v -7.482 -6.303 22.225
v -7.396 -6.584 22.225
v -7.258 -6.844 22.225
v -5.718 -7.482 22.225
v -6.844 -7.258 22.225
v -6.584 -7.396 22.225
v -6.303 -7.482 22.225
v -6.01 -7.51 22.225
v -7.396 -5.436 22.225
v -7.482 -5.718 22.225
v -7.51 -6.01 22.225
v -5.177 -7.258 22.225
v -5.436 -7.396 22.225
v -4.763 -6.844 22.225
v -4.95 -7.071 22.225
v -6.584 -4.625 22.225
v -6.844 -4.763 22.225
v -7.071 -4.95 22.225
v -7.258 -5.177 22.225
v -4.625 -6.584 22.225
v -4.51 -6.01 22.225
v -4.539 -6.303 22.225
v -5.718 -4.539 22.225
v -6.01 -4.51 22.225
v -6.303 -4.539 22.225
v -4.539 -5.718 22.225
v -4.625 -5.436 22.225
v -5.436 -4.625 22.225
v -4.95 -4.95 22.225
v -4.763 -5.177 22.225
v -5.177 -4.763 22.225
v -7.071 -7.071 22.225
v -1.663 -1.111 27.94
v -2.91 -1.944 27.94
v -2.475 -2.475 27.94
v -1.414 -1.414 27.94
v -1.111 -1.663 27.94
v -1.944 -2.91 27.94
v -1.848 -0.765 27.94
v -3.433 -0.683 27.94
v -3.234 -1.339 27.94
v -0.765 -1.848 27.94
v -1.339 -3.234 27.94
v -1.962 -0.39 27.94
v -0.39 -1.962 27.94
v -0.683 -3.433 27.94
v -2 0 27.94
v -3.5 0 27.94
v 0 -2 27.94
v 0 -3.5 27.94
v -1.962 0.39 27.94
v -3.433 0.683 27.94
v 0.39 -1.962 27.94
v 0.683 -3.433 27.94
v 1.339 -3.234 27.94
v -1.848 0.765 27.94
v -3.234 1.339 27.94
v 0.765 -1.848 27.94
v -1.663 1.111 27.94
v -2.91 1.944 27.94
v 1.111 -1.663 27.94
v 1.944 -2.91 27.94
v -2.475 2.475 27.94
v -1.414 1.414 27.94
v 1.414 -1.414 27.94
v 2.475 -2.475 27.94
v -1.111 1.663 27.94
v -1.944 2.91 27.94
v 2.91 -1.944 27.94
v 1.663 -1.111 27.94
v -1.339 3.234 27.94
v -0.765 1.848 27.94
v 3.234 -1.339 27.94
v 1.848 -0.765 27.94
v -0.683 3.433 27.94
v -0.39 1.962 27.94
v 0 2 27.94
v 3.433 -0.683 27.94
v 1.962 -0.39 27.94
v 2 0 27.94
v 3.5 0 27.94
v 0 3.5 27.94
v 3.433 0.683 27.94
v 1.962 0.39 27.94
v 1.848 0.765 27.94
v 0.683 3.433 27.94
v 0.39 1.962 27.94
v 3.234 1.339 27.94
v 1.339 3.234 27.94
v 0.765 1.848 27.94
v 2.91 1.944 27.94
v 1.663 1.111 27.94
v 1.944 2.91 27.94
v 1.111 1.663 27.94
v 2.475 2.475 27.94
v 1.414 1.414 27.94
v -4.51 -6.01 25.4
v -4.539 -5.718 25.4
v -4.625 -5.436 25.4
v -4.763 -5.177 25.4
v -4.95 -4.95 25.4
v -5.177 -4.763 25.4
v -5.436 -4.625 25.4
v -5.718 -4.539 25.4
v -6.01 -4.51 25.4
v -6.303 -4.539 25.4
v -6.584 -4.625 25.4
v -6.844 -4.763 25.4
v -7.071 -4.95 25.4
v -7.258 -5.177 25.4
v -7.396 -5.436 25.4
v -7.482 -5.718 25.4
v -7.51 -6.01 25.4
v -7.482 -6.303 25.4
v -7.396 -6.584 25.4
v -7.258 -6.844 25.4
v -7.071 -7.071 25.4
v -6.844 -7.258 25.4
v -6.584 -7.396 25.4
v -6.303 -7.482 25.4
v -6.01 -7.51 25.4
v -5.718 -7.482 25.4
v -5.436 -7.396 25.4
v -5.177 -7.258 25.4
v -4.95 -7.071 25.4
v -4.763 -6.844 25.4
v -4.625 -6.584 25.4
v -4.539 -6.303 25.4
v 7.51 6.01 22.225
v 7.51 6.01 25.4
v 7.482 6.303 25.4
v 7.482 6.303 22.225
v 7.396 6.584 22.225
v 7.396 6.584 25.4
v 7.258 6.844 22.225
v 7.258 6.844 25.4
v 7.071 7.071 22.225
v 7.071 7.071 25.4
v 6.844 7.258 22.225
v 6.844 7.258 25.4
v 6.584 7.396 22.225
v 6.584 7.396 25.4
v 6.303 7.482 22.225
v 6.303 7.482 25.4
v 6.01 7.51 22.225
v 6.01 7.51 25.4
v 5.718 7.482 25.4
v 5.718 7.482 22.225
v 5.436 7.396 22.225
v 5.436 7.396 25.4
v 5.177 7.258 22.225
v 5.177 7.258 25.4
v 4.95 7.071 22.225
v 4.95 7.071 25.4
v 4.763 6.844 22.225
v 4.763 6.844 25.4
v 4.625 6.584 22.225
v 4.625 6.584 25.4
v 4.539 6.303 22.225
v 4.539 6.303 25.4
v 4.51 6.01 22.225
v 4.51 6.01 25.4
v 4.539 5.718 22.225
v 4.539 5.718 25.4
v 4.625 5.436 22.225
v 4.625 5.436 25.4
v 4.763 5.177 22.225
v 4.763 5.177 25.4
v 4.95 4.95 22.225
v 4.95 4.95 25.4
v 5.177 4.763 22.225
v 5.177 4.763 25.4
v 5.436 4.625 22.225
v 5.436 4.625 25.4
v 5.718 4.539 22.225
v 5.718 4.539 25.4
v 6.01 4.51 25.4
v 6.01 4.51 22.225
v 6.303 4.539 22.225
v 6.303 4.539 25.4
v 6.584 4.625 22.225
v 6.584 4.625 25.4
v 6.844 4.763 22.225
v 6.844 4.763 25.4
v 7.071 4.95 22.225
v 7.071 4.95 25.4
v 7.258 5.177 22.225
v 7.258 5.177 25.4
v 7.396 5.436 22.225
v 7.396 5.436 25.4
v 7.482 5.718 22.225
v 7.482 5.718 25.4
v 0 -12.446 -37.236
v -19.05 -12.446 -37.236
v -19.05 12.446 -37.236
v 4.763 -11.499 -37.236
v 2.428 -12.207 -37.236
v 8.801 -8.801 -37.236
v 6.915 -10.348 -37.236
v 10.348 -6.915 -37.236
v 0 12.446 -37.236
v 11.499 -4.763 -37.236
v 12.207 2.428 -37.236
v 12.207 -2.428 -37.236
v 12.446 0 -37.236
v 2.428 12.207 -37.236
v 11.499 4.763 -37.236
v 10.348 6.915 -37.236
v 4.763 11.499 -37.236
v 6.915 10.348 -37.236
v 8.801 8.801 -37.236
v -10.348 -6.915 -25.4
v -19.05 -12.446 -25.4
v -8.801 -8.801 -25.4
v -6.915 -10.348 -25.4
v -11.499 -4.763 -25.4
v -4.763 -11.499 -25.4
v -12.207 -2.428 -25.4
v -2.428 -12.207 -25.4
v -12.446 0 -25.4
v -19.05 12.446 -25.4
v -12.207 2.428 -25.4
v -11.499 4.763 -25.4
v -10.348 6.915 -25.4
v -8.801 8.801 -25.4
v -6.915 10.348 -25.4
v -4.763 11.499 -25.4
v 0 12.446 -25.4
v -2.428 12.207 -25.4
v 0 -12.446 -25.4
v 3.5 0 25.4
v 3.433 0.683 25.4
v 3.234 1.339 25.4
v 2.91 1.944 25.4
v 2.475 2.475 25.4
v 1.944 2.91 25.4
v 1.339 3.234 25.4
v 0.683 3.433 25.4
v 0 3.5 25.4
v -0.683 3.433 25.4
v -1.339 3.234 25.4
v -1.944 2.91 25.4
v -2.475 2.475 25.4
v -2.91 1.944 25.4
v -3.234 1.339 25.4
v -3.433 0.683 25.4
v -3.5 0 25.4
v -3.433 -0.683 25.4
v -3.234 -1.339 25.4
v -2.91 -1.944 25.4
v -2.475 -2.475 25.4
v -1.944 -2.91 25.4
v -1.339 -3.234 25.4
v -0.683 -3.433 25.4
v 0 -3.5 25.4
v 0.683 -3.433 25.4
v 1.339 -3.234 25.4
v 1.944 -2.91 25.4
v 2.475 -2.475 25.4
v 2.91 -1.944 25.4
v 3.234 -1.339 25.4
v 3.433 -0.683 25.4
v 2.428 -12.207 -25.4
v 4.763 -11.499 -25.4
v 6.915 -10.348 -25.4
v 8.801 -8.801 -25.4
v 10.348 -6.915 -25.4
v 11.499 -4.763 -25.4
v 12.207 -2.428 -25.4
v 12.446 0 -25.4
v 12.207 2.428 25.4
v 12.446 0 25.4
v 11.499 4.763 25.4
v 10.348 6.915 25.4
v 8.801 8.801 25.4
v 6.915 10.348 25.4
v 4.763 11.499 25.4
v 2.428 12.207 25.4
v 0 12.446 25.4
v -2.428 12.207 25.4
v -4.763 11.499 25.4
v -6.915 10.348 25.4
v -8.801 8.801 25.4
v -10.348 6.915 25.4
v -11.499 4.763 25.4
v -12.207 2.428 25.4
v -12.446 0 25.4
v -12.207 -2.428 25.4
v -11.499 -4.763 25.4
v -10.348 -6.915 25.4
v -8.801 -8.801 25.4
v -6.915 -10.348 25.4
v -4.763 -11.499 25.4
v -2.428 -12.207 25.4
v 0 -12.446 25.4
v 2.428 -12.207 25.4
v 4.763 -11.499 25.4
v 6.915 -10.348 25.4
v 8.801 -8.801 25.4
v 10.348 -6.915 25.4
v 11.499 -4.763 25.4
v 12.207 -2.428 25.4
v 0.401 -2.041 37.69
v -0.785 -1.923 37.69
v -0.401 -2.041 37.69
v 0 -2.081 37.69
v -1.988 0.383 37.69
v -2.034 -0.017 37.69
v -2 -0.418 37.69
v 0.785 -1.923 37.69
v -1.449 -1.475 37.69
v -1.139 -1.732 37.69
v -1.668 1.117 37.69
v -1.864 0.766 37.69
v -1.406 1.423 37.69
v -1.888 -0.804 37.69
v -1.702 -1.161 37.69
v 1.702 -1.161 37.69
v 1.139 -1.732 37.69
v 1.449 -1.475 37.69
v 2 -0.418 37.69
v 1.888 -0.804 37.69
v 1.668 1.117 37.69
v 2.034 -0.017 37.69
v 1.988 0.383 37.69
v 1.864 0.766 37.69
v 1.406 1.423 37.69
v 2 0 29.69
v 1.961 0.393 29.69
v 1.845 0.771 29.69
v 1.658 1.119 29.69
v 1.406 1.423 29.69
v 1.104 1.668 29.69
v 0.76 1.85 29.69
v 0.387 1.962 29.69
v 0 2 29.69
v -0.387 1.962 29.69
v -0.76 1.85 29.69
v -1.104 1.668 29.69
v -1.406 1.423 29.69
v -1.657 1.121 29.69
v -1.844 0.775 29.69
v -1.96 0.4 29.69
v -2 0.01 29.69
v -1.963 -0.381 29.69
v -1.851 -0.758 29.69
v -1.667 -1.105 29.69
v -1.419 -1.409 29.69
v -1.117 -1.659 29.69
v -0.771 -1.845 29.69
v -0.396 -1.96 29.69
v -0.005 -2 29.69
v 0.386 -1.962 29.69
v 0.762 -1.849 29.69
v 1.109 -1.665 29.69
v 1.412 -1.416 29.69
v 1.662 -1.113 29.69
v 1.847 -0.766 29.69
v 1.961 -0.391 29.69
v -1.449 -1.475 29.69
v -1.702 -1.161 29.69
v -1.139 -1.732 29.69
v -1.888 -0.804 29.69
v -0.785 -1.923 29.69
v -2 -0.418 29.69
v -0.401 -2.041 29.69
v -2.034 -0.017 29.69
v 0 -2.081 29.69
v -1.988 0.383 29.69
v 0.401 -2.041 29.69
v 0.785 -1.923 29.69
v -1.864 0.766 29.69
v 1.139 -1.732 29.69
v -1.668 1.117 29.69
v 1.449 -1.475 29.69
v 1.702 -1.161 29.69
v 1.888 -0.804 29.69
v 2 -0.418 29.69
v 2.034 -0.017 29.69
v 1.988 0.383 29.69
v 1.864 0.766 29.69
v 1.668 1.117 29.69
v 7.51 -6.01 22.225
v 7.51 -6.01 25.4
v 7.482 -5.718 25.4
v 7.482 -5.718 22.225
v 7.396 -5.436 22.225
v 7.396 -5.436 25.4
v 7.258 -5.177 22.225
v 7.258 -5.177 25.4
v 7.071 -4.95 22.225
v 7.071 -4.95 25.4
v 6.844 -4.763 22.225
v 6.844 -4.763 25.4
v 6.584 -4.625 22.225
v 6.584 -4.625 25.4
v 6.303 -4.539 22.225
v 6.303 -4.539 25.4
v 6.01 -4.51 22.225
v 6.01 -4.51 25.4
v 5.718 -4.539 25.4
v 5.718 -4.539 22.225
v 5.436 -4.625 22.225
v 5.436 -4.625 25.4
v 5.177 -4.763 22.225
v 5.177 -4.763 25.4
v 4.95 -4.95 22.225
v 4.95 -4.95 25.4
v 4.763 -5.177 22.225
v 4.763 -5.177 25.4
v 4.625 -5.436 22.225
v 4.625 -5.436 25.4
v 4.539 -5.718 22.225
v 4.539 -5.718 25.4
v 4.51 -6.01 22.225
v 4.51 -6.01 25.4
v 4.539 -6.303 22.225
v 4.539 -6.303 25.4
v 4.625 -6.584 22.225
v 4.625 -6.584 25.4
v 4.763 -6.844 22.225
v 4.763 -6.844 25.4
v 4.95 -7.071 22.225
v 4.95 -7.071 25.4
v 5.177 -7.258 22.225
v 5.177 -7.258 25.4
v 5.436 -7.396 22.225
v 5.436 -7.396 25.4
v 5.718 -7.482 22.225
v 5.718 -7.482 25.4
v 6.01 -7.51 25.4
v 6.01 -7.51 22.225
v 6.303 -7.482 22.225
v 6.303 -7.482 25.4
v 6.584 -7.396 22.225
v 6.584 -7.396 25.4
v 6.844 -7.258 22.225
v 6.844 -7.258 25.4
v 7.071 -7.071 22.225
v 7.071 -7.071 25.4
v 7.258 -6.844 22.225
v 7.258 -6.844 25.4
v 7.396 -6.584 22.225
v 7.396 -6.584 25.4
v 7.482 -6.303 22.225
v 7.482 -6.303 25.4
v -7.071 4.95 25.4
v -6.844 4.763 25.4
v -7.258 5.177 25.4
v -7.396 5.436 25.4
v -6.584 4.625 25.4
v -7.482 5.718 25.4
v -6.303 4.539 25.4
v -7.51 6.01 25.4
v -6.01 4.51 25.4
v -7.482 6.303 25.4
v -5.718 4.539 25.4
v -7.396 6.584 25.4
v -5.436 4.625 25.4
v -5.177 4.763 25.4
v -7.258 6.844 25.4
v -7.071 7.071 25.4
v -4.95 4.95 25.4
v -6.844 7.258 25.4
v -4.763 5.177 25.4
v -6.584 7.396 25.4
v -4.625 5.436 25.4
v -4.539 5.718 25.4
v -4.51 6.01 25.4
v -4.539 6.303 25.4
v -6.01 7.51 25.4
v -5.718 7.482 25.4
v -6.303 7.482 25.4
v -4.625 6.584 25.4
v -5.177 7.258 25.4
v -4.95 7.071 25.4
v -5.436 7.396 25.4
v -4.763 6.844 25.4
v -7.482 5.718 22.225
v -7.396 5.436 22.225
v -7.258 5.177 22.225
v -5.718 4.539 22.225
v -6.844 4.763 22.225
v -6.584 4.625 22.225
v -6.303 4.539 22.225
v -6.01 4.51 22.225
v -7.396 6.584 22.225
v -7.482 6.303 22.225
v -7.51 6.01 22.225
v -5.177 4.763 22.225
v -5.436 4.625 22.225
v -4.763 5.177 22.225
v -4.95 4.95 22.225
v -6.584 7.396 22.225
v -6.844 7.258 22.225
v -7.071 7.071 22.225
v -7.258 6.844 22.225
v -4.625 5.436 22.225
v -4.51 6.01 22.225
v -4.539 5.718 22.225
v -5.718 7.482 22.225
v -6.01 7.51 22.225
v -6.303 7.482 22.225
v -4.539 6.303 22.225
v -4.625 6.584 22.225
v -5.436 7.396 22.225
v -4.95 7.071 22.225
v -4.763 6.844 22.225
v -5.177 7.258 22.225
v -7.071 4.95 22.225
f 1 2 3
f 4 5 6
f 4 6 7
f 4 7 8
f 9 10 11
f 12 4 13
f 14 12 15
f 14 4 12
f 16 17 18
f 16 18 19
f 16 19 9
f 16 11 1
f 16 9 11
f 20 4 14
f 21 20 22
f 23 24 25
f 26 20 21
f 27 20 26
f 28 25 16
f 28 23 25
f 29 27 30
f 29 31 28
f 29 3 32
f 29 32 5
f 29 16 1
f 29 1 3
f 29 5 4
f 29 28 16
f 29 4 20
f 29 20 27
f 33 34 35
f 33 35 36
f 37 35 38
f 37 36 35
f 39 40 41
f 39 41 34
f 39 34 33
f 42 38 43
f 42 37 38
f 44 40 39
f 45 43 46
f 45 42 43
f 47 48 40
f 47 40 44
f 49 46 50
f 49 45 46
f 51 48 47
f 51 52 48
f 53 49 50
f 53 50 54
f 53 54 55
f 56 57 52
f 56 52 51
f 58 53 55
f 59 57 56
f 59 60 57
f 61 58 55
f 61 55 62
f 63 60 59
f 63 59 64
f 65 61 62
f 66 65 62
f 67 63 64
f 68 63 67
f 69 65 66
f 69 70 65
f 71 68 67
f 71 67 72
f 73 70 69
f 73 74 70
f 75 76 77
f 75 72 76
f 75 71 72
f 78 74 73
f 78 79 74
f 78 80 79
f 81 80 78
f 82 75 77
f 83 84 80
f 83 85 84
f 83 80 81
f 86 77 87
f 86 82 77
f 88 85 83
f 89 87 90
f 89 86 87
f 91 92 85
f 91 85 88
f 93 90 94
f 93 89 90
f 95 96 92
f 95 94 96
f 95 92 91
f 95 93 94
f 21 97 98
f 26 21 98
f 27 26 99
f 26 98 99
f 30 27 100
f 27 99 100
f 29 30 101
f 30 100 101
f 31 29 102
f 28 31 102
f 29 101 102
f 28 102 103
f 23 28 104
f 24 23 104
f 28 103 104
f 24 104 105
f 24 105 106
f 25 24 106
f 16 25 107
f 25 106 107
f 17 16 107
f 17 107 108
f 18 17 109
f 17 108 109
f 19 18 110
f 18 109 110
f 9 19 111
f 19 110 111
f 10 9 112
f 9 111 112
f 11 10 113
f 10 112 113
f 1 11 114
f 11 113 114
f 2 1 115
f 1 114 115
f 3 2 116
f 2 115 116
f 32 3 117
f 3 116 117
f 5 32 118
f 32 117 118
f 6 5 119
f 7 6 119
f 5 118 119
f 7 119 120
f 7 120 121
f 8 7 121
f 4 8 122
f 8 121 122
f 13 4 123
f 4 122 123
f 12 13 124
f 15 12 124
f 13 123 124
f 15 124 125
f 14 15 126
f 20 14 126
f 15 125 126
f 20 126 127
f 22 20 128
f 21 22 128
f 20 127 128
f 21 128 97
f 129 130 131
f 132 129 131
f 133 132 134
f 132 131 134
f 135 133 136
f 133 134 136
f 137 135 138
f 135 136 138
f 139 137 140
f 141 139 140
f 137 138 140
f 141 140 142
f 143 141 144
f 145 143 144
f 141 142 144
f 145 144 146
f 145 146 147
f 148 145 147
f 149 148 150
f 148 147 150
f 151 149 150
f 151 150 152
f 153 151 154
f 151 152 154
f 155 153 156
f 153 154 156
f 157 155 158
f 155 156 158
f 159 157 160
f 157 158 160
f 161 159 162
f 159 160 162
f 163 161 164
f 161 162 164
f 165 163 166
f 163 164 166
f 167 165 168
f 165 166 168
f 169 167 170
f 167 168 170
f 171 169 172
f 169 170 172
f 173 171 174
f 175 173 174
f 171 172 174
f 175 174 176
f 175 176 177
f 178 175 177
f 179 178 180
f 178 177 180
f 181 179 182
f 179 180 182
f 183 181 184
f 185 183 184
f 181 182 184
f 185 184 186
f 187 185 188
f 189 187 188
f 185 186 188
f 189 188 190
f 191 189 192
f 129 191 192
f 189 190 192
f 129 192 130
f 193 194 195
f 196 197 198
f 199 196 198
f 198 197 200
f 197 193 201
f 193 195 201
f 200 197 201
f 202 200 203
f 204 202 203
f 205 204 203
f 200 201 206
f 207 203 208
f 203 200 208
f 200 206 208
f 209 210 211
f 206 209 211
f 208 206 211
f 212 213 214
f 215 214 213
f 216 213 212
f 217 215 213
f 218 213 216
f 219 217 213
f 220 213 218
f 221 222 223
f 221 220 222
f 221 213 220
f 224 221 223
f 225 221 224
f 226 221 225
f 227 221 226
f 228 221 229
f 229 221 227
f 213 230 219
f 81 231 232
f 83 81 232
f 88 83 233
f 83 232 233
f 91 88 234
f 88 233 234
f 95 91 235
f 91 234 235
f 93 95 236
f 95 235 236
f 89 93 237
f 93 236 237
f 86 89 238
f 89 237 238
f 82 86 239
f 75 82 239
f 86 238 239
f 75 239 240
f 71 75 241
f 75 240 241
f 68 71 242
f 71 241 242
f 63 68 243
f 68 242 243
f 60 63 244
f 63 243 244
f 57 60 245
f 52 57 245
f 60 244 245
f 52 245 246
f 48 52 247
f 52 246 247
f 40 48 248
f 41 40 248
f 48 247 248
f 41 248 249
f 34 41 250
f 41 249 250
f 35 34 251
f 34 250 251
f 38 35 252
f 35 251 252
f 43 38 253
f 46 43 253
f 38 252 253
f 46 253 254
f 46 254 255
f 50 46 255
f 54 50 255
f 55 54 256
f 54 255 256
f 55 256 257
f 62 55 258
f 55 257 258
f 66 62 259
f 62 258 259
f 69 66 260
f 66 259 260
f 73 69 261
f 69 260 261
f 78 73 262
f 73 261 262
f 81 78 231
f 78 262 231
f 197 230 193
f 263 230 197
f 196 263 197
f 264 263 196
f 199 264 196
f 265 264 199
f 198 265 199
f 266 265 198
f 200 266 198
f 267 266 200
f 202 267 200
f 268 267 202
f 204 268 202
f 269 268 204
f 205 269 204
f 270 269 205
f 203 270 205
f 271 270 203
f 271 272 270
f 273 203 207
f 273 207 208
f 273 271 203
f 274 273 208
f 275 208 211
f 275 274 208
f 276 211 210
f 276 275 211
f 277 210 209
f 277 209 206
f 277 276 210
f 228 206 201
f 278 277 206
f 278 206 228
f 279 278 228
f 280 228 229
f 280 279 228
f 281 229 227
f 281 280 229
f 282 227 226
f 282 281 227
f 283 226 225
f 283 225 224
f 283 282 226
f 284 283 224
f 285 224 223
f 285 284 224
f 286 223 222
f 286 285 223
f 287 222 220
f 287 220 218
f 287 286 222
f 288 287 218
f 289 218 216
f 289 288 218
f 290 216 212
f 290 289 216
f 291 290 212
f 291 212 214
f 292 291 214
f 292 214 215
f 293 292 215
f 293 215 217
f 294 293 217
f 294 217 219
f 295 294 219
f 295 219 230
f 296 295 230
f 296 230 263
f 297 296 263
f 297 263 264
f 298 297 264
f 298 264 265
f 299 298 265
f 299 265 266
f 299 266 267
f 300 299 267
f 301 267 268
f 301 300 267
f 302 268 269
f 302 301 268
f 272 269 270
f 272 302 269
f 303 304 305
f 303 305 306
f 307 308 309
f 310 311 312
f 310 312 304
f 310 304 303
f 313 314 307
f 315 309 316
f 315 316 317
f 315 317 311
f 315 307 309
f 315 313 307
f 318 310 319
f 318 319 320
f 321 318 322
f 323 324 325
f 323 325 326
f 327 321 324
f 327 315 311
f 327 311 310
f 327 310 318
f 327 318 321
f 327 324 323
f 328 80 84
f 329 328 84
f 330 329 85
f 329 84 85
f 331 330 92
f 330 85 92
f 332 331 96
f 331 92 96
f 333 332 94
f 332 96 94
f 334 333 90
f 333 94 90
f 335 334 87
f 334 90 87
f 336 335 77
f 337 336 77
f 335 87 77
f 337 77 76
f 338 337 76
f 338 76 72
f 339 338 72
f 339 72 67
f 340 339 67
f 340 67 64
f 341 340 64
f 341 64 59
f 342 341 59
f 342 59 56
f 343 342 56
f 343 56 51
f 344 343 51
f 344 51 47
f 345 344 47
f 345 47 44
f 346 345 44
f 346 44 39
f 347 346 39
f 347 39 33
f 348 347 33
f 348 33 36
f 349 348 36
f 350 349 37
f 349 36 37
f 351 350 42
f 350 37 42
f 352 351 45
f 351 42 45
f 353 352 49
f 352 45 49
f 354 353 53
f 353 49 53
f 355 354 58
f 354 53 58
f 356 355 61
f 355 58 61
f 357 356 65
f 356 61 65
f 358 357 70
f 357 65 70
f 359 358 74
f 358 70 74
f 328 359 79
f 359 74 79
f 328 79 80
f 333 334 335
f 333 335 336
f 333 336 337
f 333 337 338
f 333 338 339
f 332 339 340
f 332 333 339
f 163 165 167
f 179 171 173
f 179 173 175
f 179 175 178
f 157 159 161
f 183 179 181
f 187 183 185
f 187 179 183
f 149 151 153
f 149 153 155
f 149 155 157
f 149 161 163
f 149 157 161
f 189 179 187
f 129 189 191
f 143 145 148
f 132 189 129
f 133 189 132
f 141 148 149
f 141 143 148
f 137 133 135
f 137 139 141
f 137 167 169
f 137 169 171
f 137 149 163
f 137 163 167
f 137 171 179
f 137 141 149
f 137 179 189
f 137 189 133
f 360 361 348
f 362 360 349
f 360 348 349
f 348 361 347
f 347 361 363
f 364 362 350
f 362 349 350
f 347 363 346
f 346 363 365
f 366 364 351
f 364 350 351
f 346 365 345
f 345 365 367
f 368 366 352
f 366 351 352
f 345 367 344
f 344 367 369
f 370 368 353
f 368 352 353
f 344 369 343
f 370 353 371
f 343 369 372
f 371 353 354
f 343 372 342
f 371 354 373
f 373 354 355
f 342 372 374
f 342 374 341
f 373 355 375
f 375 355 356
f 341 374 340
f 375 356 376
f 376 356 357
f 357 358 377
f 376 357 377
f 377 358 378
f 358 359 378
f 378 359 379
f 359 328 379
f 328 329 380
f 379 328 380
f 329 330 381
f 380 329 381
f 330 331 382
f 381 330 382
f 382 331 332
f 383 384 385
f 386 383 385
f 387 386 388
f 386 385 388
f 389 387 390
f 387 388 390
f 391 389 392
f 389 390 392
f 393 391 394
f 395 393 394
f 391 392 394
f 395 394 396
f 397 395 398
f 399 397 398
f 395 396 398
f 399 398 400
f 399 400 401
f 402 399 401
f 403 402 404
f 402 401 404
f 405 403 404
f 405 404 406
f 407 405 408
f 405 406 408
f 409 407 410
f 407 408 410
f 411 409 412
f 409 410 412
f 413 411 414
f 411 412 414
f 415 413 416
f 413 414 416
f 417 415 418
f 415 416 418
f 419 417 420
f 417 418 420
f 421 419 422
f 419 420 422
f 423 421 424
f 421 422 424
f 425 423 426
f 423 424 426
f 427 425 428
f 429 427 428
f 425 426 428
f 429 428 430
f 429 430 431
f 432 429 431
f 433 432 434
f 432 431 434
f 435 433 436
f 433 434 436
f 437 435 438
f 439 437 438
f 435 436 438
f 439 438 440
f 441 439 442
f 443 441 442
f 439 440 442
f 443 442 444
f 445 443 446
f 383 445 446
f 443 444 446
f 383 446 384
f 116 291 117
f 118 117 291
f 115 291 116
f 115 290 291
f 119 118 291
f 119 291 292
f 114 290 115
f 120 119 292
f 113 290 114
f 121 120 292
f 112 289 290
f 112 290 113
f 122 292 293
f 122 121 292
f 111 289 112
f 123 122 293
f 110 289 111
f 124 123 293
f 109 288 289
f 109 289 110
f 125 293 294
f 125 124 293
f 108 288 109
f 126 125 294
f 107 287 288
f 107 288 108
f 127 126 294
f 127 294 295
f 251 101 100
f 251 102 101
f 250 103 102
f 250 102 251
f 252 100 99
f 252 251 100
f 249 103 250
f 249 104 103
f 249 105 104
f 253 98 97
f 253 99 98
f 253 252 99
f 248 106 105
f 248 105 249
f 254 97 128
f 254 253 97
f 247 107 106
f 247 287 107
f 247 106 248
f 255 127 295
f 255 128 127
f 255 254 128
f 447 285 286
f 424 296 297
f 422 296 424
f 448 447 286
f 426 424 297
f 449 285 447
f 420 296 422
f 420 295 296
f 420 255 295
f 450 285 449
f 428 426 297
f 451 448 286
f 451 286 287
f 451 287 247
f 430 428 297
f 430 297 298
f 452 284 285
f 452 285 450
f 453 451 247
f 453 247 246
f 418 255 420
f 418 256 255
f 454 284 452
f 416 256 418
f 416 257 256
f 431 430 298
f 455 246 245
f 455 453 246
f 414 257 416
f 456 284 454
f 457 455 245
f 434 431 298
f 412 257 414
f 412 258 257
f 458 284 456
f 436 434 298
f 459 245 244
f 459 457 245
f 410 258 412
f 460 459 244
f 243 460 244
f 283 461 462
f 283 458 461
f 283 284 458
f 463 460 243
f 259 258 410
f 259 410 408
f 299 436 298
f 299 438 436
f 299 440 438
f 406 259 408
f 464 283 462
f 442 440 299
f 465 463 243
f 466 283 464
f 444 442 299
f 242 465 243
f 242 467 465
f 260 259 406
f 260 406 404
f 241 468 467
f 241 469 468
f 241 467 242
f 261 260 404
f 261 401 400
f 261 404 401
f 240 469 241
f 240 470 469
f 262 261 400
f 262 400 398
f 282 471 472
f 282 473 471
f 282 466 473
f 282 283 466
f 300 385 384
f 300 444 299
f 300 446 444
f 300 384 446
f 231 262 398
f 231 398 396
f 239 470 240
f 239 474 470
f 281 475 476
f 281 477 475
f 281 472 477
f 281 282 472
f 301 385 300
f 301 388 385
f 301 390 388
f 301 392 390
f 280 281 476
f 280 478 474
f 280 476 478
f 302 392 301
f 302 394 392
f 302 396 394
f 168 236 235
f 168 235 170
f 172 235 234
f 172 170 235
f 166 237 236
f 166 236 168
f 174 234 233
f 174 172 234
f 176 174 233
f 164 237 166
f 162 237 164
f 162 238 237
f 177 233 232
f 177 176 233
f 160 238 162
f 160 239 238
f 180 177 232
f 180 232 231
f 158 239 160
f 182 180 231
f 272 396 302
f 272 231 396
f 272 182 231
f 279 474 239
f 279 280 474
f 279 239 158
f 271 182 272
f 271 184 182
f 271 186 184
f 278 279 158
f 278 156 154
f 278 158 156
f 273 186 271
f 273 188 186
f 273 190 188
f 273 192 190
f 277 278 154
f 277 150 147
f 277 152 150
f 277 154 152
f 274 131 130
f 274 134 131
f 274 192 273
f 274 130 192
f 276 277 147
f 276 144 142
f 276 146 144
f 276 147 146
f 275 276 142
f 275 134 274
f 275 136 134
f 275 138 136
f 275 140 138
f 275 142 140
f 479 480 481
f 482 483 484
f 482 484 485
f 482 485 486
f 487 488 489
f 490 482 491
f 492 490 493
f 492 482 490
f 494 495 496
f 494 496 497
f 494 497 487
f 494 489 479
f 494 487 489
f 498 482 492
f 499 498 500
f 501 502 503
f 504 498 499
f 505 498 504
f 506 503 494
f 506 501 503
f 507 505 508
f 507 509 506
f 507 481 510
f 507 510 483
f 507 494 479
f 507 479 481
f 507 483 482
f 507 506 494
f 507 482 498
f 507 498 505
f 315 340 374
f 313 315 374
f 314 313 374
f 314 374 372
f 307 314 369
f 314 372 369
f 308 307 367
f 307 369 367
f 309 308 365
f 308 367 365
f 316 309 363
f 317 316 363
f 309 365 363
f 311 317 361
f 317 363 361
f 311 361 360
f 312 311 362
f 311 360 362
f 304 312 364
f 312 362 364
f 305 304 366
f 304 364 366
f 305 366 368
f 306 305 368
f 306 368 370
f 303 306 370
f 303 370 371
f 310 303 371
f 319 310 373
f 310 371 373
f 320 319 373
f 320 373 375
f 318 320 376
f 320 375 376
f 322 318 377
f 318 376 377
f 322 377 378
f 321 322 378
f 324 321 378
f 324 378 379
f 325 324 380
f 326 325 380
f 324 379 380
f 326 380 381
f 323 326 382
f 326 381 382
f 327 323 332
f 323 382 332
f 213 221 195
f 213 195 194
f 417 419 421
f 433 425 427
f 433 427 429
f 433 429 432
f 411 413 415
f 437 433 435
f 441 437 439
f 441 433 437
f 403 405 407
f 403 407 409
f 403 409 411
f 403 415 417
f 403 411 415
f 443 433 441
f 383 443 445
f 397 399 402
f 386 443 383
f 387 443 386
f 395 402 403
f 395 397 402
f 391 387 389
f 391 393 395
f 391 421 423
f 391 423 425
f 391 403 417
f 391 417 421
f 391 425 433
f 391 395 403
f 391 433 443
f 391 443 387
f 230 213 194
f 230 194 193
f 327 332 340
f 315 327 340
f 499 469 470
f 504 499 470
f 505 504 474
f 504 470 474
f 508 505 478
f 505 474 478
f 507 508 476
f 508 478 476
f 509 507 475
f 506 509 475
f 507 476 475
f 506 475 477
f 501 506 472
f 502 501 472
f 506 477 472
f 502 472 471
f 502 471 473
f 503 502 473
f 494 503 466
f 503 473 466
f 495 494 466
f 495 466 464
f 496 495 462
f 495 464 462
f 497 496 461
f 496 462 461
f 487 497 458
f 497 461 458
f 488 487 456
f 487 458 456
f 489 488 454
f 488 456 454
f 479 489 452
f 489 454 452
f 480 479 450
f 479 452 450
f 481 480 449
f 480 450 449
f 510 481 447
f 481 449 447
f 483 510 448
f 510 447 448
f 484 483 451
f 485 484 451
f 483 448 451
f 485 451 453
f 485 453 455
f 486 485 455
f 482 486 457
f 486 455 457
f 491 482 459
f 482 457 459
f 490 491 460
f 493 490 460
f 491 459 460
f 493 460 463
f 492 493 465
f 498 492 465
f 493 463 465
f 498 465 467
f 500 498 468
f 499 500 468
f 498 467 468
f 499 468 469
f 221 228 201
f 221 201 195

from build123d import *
from build123d.topology import SkipClean

# Parameters (mm, degrees)
BOSS_EXTRUDE1_DEPTH      = 25.4
BOSS_EXTRUDE1_DEPTH_BACK = 25.4
SKETCH1_R                = 12.446
SKETCH2_R                = 3.5
BOSS_EXTRUDE2_DEPTH      = 2.54
SKETCH4_R                = 2
BOSS_EXTRUDE3_DEPTH      = 1.75
BOSS_EXTRUDE4_DEPTH      = 8
SKETCH6_R                = 1.5
CUT_EXTRUDE1_DEPTH       = 3.175
BOSS_EXTRUDE5_DEPTH      = 11.8364


with BuildPart() as part:
    # Sketch1 → Boss-Extrude1 (new, two sides: drawn at the far end of the back side and taken through both)
    with BuildSketch(Plane.XY.offset(-BOSS_EXTRUDE1_DEPTH_BACK)):
        Circle(SKETCH1_R)
    extrude(amount=BOSS_EXTRUDE1_DEPTH + BOSS_EXTRUDE1_DEPTH_BACK)

    # Sketch2 → Boss-Extrude2 (add)
    with BuildSketch(Plane.XY.offset(25.4)):
        Circle(SKETCH2_R)
    extrude(amount=BOSS_EXTRUDE2_DEPTH)

    # Sketch4 → Boss-Extrude3 (add)
    with BuildSketch(Plane.XY.offset(27.94)):
        Circle(SKETCH4_R)
    extrude(amount=BOSS_EXTRUDE3_DEPTH)

    # Sketch5 → Boss-Extrude4 (add)
    with BuildSketch(Plane.XY.offset(29.69)):
        with BuildLine():
            Line((1.405616757, 1.422758424), (-1.405616757, 1.422758424))
            ThreePointArc((-1.405616757, 1.422758424), (0, -2.081119268), (1.405616757, 1.422758424))
        make_face()
    extrude(amount=BOSS_EXTRUDE4_DEPTH)

    # Sketch6 → Cut-Extrude1 (cut)
    with BuildSketch(Plane.XY.offset(25.4)):
        with Locations((6.01040764, 6.01040764)):
            Circle(SKETCH6_R)
        with Locations((6.01040764, -6.01040764)):
            Circle(SKETCH6_R)
        with Locations((-6.01040764, -6.01040764)):
            Circle(SKETCH6_R)
        with Locations((-6.01040764, 6.01040764)):
            Circle(SKETCH6_R)
    extrude(amount=-CUT_EXTRUDE1_DEPTH, mode=Mode.SUBTRACT)

    # Sketch7 → Boss-Extrude5 (add)
    with SkipClean():  # the faces are left unmerged after this step: merging them gives an invalid solid
        with BuildSketch(Plane(origin=(0, 0, -25.4), x_dir=(-1, 0, 0), z_dir=(0, 0, -1))):
            with BuildLine():
                Line((0, 12.446), (19.05, 12.446))
                Line((19.05, 12.446), (19.05, -12.446))
                Line((19.05, -12.446), (0, -12.446))
                ThreePointArc((0, -12.446), (-12.446, 0), (0, 12.446))
            make_face()
        extrude(amount=BOSS_EXTRUDE5_DEPTH)
    add(part.part.scale(1), mode=Mode.REPLACE)  # the faces are merged on a copy


solid = part.part
